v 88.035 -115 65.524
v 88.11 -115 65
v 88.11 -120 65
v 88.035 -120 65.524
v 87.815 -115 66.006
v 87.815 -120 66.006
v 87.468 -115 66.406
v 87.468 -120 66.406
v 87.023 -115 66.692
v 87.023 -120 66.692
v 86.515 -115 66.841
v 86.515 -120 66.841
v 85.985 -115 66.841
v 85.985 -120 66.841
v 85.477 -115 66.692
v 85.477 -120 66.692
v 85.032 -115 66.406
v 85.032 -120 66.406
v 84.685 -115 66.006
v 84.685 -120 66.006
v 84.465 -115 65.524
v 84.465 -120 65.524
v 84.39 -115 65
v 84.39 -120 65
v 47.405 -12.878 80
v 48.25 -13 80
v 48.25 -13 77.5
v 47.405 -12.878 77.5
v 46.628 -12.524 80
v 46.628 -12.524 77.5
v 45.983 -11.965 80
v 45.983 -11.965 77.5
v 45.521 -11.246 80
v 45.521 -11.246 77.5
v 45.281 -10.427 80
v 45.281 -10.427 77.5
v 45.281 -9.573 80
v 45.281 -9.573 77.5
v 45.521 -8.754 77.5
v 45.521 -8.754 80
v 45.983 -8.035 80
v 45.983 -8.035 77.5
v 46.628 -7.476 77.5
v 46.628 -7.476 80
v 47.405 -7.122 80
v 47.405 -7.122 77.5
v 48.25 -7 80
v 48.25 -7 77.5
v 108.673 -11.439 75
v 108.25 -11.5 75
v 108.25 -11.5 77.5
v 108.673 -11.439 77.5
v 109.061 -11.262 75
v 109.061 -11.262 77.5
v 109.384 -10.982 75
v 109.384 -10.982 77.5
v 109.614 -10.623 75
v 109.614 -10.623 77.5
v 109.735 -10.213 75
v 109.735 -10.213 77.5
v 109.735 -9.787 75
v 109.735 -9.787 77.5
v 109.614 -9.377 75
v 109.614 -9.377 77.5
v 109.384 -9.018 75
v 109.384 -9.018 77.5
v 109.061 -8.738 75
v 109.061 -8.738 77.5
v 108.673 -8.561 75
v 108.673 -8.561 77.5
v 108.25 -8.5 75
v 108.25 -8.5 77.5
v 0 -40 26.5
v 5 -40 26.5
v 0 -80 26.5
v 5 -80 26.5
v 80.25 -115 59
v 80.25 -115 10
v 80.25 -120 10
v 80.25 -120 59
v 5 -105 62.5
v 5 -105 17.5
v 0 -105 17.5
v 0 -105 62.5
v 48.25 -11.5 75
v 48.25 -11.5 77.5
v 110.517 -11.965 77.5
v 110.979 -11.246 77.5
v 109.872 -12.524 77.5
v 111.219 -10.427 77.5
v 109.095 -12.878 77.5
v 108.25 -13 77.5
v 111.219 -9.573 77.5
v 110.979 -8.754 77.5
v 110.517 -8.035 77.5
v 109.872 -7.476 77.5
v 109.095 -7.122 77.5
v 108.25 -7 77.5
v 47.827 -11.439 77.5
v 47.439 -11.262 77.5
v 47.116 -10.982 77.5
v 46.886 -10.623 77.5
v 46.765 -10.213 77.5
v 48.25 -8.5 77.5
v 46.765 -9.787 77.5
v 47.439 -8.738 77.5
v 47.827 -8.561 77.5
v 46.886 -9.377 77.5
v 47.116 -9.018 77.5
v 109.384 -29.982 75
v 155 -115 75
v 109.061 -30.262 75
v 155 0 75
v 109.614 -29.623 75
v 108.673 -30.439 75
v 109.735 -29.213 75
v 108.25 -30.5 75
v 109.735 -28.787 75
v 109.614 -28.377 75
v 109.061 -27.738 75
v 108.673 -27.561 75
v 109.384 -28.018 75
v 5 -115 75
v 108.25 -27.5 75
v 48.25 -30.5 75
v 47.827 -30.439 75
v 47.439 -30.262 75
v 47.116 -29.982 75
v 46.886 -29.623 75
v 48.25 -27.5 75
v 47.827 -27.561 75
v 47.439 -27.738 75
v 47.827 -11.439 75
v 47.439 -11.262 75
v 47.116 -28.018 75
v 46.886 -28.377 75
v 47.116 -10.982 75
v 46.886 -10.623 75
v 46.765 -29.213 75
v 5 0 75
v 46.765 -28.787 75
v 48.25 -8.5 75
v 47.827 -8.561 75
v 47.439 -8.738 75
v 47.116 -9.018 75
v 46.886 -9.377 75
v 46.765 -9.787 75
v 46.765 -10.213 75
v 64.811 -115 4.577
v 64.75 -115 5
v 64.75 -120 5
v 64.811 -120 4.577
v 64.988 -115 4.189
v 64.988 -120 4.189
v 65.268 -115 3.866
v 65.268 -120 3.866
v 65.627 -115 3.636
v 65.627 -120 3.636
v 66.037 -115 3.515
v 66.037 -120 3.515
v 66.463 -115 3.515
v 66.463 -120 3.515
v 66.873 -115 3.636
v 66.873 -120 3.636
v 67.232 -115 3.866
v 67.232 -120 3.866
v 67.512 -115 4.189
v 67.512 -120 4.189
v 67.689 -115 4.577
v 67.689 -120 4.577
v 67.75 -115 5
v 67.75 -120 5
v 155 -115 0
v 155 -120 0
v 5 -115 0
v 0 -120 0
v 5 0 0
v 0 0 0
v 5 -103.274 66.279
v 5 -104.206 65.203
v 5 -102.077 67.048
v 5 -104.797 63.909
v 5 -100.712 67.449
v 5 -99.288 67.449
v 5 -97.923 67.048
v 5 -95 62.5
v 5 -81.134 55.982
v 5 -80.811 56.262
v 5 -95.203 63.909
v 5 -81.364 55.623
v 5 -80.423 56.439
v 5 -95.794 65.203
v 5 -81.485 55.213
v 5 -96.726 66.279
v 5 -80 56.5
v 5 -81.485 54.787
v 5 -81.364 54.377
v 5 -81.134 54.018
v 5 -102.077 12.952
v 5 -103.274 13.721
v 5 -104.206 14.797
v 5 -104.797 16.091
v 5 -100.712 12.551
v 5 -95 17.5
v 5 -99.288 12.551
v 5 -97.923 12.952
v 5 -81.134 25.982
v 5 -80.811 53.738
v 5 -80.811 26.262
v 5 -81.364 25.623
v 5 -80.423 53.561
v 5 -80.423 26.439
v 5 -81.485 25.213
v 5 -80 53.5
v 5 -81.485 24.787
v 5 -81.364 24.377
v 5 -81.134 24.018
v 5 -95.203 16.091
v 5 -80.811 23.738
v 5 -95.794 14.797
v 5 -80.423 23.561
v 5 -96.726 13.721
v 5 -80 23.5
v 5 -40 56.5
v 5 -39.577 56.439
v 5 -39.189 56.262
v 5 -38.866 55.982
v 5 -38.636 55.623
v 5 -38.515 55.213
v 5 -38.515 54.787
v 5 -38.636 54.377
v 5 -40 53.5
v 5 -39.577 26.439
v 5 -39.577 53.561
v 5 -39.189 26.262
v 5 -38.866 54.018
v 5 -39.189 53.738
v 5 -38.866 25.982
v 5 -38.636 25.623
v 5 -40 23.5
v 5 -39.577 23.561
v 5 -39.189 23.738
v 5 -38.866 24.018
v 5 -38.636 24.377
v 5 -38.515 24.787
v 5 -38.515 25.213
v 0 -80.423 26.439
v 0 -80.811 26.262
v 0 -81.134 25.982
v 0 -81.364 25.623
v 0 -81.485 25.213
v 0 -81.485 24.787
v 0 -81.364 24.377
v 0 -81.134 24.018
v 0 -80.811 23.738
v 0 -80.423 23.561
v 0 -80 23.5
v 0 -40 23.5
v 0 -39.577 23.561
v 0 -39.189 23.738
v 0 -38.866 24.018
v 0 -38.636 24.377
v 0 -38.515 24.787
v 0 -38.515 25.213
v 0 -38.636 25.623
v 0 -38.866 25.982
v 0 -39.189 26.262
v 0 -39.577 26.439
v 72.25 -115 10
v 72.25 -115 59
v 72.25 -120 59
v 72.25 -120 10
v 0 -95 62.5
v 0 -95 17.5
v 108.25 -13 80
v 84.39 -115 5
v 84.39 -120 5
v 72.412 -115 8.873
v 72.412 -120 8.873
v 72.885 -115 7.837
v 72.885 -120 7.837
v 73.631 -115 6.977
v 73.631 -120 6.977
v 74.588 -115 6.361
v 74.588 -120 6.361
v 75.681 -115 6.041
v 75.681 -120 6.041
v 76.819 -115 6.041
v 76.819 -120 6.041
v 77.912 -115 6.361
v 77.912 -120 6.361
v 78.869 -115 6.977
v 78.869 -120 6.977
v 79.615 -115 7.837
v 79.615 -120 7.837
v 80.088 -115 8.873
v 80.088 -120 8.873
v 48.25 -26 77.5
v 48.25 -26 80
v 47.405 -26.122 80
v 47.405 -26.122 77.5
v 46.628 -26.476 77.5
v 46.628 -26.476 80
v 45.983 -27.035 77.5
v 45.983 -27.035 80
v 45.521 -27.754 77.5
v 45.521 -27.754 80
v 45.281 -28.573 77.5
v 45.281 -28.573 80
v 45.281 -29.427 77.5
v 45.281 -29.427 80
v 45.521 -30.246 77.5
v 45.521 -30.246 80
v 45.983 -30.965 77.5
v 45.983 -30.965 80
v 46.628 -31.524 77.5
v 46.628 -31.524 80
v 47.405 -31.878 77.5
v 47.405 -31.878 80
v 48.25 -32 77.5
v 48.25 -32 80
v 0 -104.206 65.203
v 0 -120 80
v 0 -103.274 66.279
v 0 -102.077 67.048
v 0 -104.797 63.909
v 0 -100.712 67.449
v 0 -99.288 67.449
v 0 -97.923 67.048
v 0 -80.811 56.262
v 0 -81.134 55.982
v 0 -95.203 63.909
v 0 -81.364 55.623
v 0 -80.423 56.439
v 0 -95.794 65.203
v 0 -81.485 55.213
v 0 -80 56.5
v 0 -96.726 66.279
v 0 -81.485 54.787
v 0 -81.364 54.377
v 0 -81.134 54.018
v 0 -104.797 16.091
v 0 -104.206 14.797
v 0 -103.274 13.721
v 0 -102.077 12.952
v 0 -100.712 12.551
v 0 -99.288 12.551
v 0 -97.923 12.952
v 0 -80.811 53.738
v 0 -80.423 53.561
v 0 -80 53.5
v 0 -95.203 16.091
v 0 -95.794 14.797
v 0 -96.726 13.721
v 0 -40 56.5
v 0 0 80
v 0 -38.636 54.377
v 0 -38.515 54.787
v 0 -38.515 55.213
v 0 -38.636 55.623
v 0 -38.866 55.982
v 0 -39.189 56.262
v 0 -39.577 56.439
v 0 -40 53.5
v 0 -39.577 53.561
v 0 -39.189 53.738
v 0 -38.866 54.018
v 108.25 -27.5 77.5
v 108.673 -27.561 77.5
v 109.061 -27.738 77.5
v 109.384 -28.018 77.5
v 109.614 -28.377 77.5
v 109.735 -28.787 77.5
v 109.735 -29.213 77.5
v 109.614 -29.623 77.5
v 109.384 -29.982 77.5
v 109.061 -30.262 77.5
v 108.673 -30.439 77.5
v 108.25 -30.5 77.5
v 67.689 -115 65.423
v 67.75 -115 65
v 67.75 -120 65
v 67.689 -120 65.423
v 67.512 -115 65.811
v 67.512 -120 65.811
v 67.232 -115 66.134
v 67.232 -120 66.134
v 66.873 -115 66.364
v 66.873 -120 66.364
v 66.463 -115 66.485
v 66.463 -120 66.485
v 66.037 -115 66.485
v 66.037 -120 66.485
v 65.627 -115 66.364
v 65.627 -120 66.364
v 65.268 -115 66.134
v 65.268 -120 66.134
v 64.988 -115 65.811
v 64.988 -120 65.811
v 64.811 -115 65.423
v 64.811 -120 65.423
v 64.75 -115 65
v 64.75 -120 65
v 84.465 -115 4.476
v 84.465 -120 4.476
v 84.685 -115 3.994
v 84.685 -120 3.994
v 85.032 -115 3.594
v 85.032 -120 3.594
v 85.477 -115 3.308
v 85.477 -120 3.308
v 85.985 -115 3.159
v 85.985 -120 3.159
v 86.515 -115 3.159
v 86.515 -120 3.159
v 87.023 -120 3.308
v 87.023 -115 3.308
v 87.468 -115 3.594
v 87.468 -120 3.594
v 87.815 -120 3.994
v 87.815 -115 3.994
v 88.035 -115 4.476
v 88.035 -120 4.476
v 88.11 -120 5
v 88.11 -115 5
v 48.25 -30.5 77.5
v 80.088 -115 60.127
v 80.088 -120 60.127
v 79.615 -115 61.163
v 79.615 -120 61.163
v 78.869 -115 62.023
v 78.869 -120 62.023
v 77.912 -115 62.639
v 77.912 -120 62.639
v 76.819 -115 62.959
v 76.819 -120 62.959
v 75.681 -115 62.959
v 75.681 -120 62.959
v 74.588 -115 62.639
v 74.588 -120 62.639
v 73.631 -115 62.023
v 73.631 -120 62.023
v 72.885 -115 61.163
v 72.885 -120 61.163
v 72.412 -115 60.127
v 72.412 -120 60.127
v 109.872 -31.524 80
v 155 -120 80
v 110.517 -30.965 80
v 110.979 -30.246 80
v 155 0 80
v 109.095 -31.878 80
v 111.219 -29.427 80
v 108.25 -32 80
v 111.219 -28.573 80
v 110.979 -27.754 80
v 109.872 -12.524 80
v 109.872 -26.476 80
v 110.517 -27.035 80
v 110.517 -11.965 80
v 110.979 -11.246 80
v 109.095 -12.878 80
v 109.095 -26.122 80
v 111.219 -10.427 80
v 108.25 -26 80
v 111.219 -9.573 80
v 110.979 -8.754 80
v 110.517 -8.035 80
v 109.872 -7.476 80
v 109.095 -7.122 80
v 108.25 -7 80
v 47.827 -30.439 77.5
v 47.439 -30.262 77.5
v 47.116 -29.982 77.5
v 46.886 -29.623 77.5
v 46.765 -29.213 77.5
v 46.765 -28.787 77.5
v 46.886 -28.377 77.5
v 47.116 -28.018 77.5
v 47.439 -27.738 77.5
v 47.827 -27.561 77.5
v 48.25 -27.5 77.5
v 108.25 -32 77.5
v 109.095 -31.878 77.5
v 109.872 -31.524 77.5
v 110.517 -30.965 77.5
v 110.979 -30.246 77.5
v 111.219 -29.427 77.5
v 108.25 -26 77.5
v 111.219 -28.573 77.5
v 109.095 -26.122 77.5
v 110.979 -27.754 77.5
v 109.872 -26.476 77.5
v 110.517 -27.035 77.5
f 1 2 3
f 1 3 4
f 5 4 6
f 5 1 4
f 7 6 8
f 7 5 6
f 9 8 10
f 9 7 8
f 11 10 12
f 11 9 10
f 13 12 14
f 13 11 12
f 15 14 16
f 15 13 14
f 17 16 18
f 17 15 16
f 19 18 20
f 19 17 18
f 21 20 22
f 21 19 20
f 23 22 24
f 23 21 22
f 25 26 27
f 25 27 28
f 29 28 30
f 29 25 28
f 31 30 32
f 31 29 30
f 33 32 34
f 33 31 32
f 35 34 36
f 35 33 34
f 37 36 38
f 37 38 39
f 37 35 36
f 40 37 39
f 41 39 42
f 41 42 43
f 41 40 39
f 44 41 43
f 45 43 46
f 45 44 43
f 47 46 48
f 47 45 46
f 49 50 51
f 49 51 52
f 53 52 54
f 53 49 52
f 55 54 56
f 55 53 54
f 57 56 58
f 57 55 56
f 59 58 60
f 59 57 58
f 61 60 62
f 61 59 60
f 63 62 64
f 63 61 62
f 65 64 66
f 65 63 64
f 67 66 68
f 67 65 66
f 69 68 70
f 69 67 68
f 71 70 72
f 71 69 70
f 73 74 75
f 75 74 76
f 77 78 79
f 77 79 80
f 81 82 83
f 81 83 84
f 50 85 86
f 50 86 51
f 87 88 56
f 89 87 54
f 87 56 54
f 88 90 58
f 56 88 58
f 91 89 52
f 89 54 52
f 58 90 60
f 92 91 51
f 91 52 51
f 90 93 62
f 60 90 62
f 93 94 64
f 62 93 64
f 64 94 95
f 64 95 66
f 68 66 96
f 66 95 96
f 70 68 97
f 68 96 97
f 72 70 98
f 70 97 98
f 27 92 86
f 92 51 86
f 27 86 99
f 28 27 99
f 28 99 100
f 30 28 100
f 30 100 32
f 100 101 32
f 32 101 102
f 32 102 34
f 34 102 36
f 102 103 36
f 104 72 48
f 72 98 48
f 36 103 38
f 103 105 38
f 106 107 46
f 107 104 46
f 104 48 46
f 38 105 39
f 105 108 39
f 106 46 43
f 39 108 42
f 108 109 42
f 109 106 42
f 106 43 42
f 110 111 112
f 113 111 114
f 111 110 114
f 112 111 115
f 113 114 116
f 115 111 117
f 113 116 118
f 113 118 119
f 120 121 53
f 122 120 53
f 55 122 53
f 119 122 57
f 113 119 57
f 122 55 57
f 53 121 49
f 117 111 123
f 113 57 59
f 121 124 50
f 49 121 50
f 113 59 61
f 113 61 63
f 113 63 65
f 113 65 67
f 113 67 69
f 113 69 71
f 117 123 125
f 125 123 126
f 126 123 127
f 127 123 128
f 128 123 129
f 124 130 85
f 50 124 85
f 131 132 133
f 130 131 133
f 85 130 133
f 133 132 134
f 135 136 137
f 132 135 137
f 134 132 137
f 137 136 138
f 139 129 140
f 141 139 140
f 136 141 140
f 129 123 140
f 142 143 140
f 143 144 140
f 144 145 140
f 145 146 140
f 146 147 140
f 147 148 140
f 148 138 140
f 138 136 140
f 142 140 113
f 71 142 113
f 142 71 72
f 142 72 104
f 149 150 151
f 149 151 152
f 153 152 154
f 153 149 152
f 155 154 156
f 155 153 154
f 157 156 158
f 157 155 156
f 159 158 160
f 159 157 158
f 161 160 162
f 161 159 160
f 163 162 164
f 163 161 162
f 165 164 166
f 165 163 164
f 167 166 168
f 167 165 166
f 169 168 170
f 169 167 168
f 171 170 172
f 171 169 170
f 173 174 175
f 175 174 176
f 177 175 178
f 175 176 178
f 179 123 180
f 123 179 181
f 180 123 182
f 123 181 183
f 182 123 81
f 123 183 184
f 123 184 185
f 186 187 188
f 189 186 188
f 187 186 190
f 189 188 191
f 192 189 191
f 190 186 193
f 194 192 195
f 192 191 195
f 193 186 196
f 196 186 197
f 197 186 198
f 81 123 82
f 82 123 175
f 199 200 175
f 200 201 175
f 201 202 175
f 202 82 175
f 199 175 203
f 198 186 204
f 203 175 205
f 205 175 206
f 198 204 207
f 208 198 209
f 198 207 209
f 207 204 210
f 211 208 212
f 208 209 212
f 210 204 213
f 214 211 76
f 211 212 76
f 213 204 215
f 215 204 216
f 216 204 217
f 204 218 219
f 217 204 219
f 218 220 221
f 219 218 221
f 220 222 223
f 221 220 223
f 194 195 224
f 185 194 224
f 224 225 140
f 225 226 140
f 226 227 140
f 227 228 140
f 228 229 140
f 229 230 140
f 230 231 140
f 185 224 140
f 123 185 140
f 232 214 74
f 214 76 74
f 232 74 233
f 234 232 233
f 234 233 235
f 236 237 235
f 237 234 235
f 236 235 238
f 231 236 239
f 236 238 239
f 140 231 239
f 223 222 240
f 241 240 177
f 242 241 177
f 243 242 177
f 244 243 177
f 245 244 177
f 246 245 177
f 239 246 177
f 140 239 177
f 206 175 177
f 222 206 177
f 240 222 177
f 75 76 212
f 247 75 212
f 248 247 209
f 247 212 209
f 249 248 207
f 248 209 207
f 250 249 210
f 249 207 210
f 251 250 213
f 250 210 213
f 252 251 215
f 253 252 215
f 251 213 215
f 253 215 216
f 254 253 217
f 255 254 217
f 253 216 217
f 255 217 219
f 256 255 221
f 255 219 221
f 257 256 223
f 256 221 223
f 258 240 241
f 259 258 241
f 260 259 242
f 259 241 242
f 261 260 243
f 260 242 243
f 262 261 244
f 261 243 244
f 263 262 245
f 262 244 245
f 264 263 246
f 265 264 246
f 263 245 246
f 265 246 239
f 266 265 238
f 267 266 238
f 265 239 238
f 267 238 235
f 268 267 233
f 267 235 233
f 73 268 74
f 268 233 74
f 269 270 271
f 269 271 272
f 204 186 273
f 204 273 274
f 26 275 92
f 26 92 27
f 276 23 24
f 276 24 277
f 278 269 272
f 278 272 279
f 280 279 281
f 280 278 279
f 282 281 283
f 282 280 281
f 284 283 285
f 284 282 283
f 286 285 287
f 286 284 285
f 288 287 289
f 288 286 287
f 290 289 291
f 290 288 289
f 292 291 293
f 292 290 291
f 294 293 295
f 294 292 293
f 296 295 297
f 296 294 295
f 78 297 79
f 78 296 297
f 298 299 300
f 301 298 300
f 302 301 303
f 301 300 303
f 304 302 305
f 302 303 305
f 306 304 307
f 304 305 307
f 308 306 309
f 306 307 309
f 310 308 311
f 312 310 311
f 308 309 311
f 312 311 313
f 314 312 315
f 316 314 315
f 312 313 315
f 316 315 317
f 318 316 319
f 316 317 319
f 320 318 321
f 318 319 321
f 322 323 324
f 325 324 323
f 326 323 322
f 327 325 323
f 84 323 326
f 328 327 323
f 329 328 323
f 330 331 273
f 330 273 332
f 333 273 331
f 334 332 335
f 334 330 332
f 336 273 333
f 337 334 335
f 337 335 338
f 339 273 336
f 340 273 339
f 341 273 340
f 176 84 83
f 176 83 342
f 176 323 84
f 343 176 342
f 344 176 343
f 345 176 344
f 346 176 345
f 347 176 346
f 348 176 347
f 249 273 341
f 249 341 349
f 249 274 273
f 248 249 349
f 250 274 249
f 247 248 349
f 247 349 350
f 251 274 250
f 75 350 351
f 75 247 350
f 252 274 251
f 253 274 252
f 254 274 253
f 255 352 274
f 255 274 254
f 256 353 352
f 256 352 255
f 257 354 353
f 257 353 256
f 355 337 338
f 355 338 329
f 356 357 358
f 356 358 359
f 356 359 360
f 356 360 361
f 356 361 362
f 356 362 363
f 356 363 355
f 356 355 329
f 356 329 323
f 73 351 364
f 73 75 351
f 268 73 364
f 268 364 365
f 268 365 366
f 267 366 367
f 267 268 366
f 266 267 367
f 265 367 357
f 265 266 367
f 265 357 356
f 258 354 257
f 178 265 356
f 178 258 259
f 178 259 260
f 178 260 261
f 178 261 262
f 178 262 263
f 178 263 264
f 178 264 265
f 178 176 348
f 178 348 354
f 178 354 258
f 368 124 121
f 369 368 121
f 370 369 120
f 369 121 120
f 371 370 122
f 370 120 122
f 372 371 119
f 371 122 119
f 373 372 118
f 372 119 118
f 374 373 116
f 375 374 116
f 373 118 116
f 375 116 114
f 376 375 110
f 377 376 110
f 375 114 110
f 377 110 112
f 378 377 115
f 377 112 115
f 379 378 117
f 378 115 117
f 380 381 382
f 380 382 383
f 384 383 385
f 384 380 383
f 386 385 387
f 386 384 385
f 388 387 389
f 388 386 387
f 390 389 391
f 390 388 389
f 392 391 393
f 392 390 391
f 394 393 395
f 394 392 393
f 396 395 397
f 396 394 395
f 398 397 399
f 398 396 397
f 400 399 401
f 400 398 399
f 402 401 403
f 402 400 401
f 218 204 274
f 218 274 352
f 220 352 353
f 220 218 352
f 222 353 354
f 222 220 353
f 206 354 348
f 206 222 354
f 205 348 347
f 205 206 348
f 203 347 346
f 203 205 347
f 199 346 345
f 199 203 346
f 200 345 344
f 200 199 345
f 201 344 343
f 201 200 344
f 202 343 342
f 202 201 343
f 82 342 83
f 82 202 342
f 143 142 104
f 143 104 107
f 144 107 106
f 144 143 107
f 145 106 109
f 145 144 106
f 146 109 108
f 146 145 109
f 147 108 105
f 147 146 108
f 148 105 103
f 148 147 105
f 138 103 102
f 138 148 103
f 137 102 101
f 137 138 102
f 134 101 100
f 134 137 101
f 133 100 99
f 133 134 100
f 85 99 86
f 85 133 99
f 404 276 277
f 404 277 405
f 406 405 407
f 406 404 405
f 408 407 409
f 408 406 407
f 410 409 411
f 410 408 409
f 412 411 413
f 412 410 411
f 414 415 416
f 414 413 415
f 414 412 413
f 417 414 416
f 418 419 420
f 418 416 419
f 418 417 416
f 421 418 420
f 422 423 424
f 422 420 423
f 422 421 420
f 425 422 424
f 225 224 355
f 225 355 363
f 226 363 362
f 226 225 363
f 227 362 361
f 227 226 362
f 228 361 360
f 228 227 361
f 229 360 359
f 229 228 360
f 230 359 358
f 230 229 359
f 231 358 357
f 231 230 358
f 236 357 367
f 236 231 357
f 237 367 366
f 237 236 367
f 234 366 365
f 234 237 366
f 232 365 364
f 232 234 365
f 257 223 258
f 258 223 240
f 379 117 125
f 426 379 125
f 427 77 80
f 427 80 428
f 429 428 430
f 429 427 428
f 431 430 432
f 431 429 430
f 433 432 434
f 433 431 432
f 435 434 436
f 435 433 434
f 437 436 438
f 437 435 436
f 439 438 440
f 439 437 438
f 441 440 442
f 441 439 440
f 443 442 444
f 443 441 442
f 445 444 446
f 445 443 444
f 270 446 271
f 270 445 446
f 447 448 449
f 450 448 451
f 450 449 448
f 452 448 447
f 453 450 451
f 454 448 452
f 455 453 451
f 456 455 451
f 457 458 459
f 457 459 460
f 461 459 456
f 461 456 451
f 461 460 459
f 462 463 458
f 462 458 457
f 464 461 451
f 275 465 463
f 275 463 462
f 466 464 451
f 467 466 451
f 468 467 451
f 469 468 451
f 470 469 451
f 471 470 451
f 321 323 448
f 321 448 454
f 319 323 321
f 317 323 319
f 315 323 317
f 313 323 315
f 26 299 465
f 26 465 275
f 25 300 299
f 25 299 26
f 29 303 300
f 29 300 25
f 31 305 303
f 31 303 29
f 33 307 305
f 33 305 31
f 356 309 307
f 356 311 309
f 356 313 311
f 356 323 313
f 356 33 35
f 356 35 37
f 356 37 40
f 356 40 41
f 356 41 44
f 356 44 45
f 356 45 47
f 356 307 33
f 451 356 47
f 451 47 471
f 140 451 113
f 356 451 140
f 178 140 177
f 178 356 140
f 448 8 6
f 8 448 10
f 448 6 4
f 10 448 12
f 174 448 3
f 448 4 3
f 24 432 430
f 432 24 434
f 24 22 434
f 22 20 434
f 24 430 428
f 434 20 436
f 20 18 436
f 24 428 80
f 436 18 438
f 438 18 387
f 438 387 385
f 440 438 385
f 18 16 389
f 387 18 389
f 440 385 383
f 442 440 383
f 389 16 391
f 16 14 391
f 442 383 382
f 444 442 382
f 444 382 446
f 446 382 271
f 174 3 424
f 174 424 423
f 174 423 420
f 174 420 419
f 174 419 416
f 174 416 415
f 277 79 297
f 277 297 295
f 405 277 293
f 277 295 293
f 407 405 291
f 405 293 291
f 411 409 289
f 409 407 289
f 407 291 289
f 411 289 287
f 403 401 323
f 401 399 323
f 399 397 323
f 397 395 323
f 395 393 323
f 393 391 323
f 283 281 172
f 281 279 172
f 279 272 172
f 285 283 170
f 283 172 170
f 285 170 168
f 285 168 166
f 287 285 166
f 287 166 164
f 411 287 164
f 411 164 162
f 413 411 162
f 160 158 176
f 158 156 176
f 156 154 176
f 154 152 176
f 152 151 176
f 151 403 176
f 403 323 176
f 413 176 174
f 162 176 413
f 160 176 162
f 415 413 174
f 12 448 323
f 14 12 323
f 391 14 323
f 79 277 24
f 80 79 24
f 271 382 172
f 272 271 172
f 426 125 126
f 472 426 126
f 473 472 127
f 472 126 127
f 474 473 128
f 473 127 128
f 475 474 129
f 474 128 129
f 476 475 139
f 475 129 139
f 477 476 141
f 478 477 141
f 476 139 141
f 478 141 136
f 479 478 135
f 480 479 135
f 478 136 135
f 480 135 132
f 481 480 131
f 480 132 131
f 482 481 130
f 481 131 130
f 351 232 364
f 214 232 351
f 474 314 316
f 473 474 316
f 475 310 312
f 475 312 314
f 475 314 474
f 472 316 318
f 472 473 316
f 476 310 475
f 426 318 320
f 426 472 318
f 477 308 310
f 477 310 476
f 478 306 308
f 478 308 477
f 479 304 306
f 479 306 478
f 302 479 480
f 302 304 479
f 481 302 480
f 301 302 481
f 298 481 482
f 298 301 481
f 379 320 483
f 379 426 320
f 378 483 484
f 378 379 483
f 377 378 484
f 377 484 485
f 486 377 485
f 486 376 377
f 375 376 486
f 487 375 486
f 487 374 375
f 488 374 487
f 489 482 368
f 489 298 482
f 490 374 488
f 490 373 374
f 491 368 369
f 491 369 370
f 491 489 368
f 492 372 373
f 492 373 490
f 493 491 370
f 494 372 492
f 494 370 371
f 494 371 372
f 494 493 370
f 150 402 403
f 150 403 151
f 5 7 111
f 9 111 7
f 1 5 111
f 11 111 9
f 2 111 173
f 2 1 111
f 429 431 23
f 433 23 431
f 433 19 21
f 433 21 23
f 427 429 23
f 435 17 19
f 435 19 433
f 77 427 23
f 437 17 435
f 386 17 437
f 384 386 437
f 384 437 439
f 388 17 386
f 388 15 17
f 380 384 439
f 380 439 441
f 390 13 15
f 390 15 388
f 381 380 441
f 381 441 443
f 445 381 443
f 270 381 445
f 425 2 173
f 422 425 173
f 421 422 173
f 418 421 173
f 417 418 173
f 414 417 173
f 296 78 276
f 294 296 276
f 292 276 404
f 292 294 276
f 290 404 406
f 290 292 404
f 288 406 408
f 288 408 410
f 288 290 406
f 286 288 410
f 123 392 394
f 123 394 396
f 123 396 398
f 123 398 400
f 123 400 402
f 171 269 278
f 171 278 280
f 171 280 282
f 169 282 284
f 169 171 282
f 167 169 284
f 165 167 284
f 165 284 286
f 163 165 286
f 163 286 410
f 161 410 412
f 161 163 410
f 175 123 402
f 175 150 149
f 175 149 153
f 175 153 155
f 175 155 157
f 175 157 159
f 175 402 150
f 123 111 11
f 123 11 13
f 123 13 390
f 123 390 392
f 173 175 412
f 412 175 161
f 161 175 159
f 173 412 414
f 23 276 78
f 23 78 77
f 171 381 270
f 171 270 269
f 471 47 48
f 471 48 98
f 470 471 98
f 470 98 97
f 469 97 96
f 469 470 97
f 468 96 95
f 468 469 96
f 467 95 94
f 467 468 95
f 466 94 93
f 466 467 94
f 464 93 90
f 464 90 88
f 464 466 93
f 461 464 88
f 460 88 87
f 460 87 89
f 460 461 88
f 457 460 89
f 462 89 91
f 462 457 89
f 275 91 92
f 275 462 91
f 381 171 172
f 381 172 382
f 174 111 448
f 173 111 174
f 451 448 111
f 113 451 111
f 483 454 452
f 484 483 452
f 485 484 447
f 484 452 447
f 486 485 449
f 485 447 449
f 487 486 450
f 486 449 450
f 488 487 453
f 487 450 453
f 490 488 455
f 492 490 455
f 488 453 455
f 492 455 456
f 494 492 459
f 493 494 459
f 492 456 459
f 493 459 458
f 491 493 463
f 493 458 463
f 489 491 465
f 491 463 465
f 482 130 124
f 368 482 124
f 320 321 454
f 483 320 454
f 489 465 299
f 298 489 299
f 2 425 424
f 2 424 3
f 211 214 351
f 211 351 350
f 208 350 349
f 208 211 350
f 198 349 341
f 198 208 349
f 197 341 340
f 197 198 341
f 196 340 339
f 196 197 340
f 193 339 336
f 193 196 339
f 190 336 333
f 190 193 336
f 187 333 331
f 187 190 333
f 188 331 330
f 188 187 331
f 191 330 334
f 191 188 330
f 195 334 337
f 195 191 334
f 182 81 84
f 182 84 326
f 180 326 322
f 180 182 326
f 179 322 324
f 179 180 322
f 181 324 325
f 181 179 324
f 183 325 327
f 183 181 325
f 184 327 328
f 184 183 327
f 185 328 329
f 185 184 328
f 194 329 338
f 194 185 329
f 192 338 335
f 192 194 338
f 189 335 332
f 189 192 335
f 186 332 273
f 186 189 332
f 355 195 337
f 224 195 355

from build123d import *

# Parameters (mm, degrees)
SKETCH_1_W          = 5
SKETCH_1_H          = 120
EXTRUDE_1_DEPTH     = 80
SKETCH_2_W          = 80
SKETCH_2_H          = 5
EXTRUDE_2_DEPTH     = 150
CUT_EXTRUDE_1_REACH = 7
SKETCH_4_W          = 5
SKETCH_4_H          = 115
EXTRUDE_3_DEPTH     = 150
CUT_EXTRUDE_4_DEPTH = 2.5
CUT_EXTRUDE_5_DEPTH = 6
CUT_EXTRUDE_6_DEPTH = 6


with BuildPart() as part:
    # 草图1 → 凸台-拉伸1 (new body)
    with BuildSketch(Plane.XY):
        with Locations((2.5, -60)):
            Rectangle(SKETCH_1_W, SKETCH_1_H)
    extrude(amount=EXTRUDE_1_DEPTH)

    # 草图2 → 凸台-拉伸2 (add)
    with BuildSketch(Plane(origin=(5, 0, 0), x_dir=(0, 0, -1), z_dir=(1, 0, 0))):
        with Locations((-40, -117.5)):
            Rectangle(SKETCH_2_W, SKETCH_2_H)
    extrude(amount=EXTRUDE_2_DEPTH)

    # 草图3 → 切除-拉伸1 (cut, up to next)
    with BuildSketch(Plane(origin=(5, 0, 0), x_dir=(0, 0, -1), z_dir=(1, 0, 0)), mode=Mode.PRIVATE) as cut_extrude_1_sk1:
        with BuildLine():
            Line((-53.5, -40), (-53.5, -80))
            ThreePointArc((-53.5, -80), (-55, -81.5), (-56.5, -80))
            Line((-56.5, -80), (-56.5, -40))
            ThreePointArc((-56.5, -40), (-55, -38.5), (-53.5, -40))
        make_face()
    cut_extrude_1_tool1 = extrude(cut_extrude_1_sk1.sketch, amount=-CUT_EXTRUDE_1_REACH, mode=Mode.PRIVATE) & part.part
    add(cut_extrude_1_tool1.solids().sort_by_distance((5, -60, 55))[0], mode=Mode.SUBTRACT)
    # 草图3 → 切除-拉伸1 (cut, up to next)
    with BuildSketch(Plane(origin=(5, 0, 0), x_dir=(0, 0, -1), z_dir=(1, 0, 0)), mode=Mode.PRIVATE) as cut_extrude_1_sk2:
        with BuildLine():
            Line((-26.5, -40), (-26.5, -80))
            ThreePointArc((-26.5, -80), (-25, -81.5), (-23.5, -80))
            Line((-23.5, -80), (-23.5, -40))
            ThreePointArc((-23.5, -40), (-25, -38.5), (-26.5, -40))
        make_face()
    cut_extrude_1_tool2 = extrude(cut_extrude_1_sk2.sketch, amount=-CUT_EXTRUDE_1_REACH, mode=Mode.PRIVATE) & part.part
    add(cut_extrude_1_tool2.solids().sort_by_distance((5, -60, 25))[0], mode=Mode.SUBTRACT)
    # 草图3 → 切除-拉伸1 (cut, up to next)
    with BuildSketch(Plane(origin=(5, 0, 0), x_dir=(0, 0, -1), z_dir=(1, 0, 0)), mode=Mode.PRIVATE) as cut_extrude_1_sk3:
        with BuildLine():
            Line((-62.5, -95), (-17.5, -95))
            ThreePointArc((-17.5, -95), (-12.5, -100), (-17.5, -105))
            Line((-17.5, -105), (-62.5, -105))
            ThreePointArc((-62.5, -105), (-67.5, -100), (-62.5, -95))
        make_face()
    cut_extrude_1_tool3 = extrude(cut_extrude_1_sk3.sketch, amount=-CUT_EXTRUDE_1_REACH, mode=Mode.PRIVATE) & part.part
    add(cut_extrude_1_tool3.solids().sort_by_distance((5, -100, 40))[0], mode=Mode.SUBTRACT)

    # 草图4 → 凸台-拉伸3 (add)
    with BuildSketch(Plane(origin=(5, 0, 0), x_dir=(0, 0, -1), z_dir=(1, 0, 0))):
        with Locations((-77.5, -57.5)):
            Rectangle(SKETCH_4_W, SKETCH_4_H)
    extrude(amount=EXTRUDE_3_DEPTH)

    # 草图8 → 切除-拉伸4 (cut)
    with BuildSketch(Plane.XY.offset(80)):
        with BuildLine():
            Line((48.25, -7), (108.25, -7))
            ThreePointArc((108.25, -7), (111.25, -10), (108.25, -13))
            Line((108.25, -13), (48.25, -13))
            ThreePointArc((48.25, -13), (45.25, -10), (48.25, -7))
        make_face()
        with BuildLine():
            Line((48.25, -32), (108.25, -32))
            ThreePointArc((108.25, -32), (111.25, -29), (108.25, -26))
            Line((108.25, -26), (48.25, -26))
            ThreePointArc((48.25, -26), (45.25, -29), (48.25, -32))
        make_face()
    extrude(amount=-CUT_EXTRUDE_4_DEPTH, mode=Mode.SUBTRACT)

    # 草图6 → 切除-拉伸5 (cut, through all)
    with BuildSketch(Plane(origin=(0, 0, 75), x_dir=(-1, 0, 0), z_dir=(0, 0, -1))):
        with BuildLine():
            Line((-48.25, -11.5), (-108.25, -11.5))
            ThreePointArc((-108.25, -11.5), (-109.75, -10), (-108.25, -8.5))
            Line((-108.25, -8.5), (-48.25, -8.5))
            ThreePointArc((-48.25, -8.5), (-46.75, -10), (-48.25, -11.5))
        make_face()
        with BuildLine():
            Line((-48.25, -27.5), (-108.25, -27.5))
            ThreePointArc((-108.25, -27.5), (-109.75, -29), (-108.25, -30.5))
            Line((-108.25, -30.5), (-48.25, -30.5))
            ThreePointArc((-48.25, -30.5), (-46.75, -29), (-48.25, -27.5))
        make_face()
    extrude(amount=-CUT_EXTRUDE_5_DEPTH, mode=Mode.SUBTRACT)

    # 草图9 → 切除-拉伸6 (cut, through all)
    with BuildSketch(Plane(origin=(0, -115, 0), x_dir=(1, 0, 0), z_dir=(0, 1, 0))):
        with BuildLine():
            Line((80.25, -10), (80.25, -59))
            ThreePointArc((80.25, -59), (76.25, -63), (72.25, -59))
            Line((72.25, -59), (72.25, -10))
            ThreePointArc((72.25, -10), (76.25, -6), (80.25, -10))
        make_face()
        with BuildLine():
            Line((67.75, -5), (67.75, -65))
            ThreePointArc((67.75, -65), (66.25, -66.5), (64.75, -65))
            Line((64.75, -65), (64.75, -5))
            ThreePointArc((64.75, -5), (66.25, -3.5), (67.75, -5))
        make_face()
        with BuildLine():
            Line((88.109913979, -5), (88.109913979, -65))
            ThreePointArc((88.109913979, -65), (86.25, -66.859913979), (84.390086021, -65))
            Line((84.390086021, -65), (84.390086021, -5))
            ThreePointArc((84.390086021, -5), (86.25, -3.140086021), (88.109913979, -5))
        make_face()
    extrude(amount=-CUT_EXTRUDE_6_DEPTH, mode=Mode.SUBTRACT)


solid = part.part
